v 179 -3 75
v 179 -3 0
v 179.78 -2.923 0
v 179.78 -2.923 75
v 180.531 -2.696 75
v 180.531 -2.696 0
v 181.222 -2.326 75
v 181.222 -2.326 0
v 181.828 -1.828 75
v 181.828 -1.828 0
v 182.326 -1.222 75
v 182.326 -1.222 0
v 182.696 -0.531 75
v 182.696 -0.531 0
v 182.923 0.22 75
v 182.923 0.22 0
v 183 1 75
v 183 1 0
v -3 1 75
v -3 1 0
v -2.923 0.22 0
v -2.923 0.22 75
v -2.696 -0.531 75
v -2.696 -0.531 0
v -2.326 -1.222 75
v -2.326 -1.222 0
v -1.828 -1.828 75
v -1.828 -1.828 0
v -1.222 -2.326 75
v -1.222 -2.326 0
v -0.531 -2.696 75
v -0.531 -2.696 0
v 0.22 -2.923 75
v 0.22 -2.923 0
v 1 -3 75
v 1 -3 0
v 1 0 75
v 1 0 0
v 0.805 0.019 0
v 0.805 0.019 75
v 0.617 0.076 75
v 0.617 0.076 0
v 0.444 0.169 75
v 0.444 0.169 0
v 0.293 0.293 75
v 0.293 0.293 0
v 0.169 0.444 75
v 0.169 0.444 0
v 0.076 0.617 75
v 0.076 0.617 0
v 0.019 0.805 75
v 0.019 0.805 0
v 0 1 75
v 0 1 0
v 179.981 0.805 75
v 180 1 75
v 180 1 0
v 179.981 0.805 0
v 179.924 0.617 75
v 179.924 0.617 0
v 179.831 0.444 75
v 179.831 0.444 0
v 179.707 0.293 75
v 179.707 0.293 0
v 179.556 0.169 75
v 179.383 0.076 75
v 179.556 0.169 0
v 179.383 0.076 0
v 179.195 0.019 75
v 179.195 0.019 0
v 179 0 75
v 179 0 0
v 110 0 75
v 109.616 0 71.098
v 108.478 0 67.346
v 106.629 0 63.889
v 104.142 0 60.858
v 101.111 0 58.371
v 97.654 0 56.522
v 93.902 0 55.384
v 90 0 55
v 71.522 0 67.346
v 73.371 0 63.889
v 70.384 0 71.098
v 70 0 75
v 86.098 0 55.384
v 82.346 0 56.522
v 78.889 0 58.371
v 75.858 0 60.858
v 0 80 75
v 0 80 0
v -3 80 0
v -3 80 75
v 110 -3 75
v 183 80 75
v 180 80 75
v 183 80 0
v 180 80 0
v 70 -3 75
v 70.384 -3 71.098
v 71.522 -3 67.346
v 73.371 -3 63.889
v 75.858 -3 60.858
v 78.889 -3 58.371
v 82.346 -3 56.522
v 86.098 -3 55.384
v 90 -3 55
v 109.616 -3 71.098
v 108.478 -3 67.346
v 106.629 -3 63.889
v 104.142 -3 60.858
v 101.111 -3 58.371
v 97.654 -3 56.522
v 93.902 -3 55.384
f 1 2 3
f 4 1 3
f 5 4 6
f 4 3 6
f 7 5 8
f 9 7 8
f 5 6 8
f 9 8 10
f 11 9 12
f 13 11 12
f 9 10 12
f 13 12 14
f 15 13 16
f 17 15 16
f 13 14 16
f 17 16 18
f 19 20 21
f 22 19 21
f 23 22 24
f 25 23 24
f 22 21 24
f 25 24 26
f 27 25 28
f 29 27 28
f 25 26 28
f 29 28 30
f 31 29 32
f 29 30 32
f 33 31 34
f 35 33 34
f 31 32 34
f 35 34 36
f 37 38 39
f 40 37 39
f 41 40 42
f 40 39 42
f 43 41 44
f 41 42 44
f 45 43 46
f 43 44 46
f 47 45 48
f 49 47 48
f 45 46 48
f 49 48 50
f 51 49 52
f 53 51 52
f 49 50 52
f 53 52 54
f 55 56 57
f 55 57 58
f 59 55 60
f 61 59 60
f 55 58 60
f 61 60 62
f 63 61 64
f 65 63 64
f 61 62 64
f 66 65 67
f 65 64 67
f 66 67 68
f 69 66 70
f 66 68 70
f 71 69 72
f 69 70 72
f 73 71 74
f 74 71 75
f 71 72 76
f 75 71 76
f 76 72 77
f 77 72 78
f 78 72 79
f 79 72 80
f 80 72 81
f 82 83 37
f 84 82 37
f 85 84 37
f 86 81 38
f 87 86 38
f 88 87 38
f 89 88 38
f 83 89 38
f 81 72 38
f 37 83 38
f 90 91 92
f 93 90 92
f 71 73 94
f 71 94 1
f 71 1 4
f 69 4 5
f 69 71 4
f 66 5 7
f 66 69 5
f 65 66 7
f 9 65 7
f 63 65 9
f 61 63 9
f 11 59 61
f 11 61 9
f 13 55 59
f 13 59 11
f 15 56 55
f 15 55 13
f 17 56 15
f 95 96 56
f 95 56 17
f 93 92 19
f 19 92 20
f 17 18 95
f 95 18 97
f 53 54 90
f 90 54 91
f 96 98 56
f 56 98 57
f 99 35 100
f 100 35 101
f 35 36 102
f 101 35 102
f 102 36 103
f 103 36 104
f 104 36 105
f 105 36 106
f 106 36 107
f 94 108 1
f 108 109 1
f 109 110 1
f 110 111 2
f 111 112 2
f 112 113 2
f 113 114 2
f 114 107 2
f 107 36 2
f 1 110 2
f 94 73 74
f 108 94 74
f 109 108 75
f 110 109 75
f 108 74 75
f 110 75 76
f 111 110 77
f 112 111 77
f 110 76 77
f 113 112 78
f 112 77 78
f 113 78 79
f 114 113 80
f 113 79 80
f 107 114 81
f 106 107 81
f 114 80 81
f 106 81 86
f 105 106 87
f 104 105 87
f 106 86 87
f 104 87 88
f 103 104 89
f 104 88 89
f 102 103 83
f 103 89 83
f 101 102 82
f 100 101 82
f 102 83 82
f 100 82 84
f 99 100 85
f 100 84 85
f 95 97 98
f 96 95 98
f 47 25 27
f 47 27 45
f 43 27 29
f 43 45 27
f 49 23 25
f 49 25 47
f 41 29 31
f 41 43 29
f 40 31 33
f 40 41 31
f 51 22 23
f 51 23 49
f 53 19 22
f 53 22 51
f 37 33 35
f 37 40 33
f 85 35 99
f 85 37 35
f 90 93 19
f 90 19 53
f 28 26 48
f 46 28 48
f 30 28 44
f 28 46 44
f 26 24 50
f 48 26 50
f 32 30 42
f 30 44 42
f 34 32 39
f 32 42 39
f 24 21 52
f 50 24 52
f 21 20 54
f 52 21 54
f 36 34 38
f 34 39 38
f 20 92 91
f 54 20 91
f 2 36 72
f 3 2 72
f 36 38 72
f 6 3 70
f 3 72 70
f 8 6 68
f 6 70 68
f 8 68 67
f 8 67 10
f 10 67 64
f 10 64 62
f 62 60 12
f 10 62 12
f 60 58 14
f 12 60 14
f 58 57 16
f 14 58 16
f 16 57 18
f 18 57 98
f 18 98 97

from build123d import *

# Parameters (mm, degrees)
BRIDA_BASE1_DEPTH     = 75
CROQUIS6_R            = 20
CORTAR_EXTRUIR1_DEPTH = 10


# Sheet-metal steps are written as plain solids
with BuildPart() as part:
    # Croquis1 → Brida base1 (new body)
    with BuildSketch(Plane.XY):
        with BuildLine():
            Line((180, 80), (180, 1))
            ThreePointArc((180, 1), (179.707106781, 0.292893219), (179, 0))
            Line((179, 0), (1, 0))
            ThreePointArc((1, 0), (0.292893219, 0.292893219), (0, 1))
            Line((0, 1), (0, 80))
            Line((0, 80), (-3, 80))
            Line((-3, 80), (-3, 1))
            ThreePointArc((-3, 1), (-1.828427125, -1.828427125), (1, -3))
            Line((1, -3), (179, -3))
            ThreePointArc((179, -3), (181.828427125, -1.828427125), (183, 1))
            Line((183, 1), (183, 80))
            Line((183, 80), (180, 80))
        make_face()
    extrude(amount=BRIDA_BASE1_DEPTH)

    # Croquis6 → Cortar-Extruir1 (cut)
    with BuildSketch(Plane(origin=(0, 0, 0), x_dir=(1, 0, 0), z_dir=(0, 1, 0))):
        with Locations((90, -75)):
            Circle(CROQUIS6_R)
    extrude(amount=-CORTAR_EXTRUIR1_DEPTH, mode=Mode.SUBTRACT)


solid = part.part
